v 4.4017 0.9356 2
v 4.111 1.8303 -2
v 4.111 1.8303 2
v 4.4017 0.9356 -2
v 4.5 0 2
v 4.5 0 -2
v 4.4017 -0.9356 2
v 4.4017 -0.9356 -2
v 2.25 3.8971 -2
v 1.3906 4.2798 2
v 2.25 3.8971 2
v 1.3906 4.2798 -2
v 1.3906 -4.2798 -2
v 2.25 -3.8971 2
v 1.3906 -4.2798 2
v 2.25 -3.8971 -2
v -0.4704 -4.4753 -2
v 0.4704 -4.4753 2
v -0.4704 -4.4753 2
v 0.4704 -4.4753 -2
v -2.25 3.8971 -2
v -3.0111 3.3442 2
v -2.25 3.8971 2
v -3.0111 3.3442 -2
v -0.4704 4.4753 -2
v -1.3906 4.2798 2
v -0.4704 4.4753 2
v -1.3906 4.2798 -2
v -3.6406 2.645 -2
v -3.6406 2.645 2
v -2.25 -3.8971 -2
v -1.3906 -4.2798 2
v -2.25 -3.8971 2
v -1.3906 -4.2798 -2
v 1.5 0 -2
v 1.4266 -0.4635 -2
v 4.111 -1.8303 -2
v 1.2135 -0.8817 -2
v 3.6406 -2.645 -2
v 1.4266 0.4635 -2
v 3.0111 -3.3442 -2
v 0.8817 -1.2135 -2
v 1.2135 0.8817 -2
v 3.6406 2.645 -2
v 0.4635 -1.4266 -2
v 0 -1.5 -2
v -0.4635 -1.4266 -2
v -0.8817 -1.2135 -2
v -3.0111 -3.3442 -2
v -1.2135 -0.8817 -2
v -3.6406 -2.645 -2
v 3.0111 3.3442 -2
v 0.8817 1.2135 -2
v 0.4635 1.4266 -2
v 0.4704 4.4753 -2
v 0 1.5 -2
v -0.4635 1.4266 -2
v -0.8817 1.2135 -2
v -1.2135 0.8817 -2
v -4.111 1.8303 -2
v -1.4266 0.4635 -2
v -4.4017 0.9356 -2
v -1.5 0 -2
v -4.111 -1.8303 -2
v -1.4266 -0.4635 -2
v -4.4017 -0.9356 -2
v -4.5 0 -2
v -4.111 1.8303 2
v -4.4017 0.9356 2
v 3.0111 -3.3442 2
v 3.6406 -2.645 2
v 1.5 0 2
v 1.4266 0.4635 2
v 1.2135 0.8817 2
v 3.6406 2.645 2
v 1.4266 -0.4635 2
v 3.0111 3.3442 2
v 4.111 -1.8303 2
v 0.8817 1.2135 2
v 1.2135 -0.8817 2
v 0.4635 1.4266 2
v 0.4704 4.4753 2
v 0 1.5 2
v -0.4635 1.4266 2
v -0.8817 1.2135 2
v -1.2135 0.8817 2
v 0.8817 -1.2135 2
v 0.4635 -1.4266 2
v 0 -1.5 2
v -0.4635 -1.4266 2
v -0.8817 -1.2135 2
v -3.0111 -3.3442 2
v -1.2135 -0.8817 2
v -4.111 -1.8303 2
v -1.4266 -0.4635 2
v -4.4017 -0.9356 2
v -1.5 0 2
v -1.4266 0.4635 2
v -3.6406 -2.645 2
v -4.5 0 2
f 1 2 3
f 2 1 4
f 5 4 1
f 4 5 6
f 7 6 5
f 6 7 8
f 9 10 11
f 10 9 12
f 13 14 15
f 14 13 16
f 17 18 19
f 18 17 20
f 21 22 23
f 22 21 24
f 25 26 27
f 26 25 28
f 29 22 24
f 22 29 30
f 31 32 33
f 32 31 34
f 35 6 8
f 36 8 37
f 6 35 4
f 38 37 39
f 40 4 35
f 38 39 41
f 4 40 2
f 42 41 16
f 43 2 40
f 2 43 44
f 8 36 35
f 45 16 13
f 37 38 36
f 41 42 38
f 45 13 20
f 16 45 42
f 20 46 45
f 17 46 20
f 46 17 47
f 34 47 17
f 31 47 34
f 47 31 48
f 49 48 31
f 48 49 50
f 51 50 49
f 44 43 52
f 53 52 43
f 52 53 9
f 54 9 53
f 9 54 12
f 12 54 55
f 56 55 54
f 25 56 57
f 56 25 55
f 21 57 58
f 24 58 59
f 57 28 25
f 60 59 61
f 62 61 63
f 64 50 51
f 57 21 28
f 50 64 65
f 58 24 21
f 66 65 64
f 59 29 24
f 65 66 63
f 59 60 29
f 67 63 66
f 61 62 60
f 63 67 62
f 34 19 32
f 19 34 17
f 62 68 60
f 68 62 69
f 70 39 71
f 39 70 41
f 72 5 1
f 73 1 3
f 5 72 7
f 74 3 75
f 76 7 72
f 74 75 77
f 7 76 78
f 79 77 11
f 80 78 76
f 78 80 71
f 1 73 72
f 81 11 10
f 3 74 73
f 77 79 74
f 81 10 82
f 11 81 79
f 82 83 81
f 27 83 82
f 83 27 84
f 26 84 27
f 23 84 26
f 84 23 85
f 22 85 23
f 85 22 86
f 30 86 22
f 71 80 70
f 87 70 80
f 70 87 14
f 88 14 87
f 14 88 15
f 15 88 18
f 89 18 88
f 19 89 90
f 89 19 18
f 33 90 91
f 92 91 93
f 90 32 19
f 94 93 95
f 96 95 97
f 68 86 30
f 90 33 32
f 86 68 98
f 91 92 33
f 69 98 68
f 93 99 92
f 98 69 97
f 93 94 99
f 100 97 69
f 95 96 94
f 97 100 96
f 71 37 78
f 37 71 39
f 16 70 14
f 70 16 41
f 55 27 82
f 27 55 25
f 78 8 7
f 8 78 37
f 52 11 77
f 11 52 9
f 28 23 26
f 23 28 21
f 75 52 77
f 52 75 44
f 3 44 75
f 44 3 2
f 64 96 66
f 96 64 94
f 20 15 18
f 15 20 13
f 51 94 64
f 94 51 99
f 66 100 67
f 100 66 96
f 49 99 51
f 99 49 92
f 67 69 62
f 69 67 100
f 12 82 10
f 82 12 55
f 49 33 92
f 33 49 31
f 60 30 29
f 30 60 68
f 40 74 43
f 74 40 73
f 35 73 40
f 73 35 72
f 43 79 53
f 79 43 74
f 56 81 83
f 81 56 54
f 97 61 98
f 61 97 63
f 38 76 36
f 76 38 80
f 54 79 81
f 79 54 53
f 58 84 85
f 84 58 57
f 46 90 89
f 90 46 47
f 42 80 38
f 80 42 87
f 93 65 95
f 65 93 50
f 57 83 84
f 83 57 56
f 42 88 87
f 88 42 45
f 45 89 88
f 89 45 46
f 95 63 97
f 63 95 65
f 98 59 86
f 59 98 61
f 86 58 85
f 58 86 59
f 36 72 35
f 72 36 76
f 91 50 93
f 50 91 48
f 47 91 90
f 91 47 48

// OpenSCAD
h = 4;
di = 3;
de = 9;


difference() {
  cylinder(r = de/2, h = h, center = true, $fn = 30);
  cylinder(r = di/2, h = h+1, center = true, $fn = 20);
}
